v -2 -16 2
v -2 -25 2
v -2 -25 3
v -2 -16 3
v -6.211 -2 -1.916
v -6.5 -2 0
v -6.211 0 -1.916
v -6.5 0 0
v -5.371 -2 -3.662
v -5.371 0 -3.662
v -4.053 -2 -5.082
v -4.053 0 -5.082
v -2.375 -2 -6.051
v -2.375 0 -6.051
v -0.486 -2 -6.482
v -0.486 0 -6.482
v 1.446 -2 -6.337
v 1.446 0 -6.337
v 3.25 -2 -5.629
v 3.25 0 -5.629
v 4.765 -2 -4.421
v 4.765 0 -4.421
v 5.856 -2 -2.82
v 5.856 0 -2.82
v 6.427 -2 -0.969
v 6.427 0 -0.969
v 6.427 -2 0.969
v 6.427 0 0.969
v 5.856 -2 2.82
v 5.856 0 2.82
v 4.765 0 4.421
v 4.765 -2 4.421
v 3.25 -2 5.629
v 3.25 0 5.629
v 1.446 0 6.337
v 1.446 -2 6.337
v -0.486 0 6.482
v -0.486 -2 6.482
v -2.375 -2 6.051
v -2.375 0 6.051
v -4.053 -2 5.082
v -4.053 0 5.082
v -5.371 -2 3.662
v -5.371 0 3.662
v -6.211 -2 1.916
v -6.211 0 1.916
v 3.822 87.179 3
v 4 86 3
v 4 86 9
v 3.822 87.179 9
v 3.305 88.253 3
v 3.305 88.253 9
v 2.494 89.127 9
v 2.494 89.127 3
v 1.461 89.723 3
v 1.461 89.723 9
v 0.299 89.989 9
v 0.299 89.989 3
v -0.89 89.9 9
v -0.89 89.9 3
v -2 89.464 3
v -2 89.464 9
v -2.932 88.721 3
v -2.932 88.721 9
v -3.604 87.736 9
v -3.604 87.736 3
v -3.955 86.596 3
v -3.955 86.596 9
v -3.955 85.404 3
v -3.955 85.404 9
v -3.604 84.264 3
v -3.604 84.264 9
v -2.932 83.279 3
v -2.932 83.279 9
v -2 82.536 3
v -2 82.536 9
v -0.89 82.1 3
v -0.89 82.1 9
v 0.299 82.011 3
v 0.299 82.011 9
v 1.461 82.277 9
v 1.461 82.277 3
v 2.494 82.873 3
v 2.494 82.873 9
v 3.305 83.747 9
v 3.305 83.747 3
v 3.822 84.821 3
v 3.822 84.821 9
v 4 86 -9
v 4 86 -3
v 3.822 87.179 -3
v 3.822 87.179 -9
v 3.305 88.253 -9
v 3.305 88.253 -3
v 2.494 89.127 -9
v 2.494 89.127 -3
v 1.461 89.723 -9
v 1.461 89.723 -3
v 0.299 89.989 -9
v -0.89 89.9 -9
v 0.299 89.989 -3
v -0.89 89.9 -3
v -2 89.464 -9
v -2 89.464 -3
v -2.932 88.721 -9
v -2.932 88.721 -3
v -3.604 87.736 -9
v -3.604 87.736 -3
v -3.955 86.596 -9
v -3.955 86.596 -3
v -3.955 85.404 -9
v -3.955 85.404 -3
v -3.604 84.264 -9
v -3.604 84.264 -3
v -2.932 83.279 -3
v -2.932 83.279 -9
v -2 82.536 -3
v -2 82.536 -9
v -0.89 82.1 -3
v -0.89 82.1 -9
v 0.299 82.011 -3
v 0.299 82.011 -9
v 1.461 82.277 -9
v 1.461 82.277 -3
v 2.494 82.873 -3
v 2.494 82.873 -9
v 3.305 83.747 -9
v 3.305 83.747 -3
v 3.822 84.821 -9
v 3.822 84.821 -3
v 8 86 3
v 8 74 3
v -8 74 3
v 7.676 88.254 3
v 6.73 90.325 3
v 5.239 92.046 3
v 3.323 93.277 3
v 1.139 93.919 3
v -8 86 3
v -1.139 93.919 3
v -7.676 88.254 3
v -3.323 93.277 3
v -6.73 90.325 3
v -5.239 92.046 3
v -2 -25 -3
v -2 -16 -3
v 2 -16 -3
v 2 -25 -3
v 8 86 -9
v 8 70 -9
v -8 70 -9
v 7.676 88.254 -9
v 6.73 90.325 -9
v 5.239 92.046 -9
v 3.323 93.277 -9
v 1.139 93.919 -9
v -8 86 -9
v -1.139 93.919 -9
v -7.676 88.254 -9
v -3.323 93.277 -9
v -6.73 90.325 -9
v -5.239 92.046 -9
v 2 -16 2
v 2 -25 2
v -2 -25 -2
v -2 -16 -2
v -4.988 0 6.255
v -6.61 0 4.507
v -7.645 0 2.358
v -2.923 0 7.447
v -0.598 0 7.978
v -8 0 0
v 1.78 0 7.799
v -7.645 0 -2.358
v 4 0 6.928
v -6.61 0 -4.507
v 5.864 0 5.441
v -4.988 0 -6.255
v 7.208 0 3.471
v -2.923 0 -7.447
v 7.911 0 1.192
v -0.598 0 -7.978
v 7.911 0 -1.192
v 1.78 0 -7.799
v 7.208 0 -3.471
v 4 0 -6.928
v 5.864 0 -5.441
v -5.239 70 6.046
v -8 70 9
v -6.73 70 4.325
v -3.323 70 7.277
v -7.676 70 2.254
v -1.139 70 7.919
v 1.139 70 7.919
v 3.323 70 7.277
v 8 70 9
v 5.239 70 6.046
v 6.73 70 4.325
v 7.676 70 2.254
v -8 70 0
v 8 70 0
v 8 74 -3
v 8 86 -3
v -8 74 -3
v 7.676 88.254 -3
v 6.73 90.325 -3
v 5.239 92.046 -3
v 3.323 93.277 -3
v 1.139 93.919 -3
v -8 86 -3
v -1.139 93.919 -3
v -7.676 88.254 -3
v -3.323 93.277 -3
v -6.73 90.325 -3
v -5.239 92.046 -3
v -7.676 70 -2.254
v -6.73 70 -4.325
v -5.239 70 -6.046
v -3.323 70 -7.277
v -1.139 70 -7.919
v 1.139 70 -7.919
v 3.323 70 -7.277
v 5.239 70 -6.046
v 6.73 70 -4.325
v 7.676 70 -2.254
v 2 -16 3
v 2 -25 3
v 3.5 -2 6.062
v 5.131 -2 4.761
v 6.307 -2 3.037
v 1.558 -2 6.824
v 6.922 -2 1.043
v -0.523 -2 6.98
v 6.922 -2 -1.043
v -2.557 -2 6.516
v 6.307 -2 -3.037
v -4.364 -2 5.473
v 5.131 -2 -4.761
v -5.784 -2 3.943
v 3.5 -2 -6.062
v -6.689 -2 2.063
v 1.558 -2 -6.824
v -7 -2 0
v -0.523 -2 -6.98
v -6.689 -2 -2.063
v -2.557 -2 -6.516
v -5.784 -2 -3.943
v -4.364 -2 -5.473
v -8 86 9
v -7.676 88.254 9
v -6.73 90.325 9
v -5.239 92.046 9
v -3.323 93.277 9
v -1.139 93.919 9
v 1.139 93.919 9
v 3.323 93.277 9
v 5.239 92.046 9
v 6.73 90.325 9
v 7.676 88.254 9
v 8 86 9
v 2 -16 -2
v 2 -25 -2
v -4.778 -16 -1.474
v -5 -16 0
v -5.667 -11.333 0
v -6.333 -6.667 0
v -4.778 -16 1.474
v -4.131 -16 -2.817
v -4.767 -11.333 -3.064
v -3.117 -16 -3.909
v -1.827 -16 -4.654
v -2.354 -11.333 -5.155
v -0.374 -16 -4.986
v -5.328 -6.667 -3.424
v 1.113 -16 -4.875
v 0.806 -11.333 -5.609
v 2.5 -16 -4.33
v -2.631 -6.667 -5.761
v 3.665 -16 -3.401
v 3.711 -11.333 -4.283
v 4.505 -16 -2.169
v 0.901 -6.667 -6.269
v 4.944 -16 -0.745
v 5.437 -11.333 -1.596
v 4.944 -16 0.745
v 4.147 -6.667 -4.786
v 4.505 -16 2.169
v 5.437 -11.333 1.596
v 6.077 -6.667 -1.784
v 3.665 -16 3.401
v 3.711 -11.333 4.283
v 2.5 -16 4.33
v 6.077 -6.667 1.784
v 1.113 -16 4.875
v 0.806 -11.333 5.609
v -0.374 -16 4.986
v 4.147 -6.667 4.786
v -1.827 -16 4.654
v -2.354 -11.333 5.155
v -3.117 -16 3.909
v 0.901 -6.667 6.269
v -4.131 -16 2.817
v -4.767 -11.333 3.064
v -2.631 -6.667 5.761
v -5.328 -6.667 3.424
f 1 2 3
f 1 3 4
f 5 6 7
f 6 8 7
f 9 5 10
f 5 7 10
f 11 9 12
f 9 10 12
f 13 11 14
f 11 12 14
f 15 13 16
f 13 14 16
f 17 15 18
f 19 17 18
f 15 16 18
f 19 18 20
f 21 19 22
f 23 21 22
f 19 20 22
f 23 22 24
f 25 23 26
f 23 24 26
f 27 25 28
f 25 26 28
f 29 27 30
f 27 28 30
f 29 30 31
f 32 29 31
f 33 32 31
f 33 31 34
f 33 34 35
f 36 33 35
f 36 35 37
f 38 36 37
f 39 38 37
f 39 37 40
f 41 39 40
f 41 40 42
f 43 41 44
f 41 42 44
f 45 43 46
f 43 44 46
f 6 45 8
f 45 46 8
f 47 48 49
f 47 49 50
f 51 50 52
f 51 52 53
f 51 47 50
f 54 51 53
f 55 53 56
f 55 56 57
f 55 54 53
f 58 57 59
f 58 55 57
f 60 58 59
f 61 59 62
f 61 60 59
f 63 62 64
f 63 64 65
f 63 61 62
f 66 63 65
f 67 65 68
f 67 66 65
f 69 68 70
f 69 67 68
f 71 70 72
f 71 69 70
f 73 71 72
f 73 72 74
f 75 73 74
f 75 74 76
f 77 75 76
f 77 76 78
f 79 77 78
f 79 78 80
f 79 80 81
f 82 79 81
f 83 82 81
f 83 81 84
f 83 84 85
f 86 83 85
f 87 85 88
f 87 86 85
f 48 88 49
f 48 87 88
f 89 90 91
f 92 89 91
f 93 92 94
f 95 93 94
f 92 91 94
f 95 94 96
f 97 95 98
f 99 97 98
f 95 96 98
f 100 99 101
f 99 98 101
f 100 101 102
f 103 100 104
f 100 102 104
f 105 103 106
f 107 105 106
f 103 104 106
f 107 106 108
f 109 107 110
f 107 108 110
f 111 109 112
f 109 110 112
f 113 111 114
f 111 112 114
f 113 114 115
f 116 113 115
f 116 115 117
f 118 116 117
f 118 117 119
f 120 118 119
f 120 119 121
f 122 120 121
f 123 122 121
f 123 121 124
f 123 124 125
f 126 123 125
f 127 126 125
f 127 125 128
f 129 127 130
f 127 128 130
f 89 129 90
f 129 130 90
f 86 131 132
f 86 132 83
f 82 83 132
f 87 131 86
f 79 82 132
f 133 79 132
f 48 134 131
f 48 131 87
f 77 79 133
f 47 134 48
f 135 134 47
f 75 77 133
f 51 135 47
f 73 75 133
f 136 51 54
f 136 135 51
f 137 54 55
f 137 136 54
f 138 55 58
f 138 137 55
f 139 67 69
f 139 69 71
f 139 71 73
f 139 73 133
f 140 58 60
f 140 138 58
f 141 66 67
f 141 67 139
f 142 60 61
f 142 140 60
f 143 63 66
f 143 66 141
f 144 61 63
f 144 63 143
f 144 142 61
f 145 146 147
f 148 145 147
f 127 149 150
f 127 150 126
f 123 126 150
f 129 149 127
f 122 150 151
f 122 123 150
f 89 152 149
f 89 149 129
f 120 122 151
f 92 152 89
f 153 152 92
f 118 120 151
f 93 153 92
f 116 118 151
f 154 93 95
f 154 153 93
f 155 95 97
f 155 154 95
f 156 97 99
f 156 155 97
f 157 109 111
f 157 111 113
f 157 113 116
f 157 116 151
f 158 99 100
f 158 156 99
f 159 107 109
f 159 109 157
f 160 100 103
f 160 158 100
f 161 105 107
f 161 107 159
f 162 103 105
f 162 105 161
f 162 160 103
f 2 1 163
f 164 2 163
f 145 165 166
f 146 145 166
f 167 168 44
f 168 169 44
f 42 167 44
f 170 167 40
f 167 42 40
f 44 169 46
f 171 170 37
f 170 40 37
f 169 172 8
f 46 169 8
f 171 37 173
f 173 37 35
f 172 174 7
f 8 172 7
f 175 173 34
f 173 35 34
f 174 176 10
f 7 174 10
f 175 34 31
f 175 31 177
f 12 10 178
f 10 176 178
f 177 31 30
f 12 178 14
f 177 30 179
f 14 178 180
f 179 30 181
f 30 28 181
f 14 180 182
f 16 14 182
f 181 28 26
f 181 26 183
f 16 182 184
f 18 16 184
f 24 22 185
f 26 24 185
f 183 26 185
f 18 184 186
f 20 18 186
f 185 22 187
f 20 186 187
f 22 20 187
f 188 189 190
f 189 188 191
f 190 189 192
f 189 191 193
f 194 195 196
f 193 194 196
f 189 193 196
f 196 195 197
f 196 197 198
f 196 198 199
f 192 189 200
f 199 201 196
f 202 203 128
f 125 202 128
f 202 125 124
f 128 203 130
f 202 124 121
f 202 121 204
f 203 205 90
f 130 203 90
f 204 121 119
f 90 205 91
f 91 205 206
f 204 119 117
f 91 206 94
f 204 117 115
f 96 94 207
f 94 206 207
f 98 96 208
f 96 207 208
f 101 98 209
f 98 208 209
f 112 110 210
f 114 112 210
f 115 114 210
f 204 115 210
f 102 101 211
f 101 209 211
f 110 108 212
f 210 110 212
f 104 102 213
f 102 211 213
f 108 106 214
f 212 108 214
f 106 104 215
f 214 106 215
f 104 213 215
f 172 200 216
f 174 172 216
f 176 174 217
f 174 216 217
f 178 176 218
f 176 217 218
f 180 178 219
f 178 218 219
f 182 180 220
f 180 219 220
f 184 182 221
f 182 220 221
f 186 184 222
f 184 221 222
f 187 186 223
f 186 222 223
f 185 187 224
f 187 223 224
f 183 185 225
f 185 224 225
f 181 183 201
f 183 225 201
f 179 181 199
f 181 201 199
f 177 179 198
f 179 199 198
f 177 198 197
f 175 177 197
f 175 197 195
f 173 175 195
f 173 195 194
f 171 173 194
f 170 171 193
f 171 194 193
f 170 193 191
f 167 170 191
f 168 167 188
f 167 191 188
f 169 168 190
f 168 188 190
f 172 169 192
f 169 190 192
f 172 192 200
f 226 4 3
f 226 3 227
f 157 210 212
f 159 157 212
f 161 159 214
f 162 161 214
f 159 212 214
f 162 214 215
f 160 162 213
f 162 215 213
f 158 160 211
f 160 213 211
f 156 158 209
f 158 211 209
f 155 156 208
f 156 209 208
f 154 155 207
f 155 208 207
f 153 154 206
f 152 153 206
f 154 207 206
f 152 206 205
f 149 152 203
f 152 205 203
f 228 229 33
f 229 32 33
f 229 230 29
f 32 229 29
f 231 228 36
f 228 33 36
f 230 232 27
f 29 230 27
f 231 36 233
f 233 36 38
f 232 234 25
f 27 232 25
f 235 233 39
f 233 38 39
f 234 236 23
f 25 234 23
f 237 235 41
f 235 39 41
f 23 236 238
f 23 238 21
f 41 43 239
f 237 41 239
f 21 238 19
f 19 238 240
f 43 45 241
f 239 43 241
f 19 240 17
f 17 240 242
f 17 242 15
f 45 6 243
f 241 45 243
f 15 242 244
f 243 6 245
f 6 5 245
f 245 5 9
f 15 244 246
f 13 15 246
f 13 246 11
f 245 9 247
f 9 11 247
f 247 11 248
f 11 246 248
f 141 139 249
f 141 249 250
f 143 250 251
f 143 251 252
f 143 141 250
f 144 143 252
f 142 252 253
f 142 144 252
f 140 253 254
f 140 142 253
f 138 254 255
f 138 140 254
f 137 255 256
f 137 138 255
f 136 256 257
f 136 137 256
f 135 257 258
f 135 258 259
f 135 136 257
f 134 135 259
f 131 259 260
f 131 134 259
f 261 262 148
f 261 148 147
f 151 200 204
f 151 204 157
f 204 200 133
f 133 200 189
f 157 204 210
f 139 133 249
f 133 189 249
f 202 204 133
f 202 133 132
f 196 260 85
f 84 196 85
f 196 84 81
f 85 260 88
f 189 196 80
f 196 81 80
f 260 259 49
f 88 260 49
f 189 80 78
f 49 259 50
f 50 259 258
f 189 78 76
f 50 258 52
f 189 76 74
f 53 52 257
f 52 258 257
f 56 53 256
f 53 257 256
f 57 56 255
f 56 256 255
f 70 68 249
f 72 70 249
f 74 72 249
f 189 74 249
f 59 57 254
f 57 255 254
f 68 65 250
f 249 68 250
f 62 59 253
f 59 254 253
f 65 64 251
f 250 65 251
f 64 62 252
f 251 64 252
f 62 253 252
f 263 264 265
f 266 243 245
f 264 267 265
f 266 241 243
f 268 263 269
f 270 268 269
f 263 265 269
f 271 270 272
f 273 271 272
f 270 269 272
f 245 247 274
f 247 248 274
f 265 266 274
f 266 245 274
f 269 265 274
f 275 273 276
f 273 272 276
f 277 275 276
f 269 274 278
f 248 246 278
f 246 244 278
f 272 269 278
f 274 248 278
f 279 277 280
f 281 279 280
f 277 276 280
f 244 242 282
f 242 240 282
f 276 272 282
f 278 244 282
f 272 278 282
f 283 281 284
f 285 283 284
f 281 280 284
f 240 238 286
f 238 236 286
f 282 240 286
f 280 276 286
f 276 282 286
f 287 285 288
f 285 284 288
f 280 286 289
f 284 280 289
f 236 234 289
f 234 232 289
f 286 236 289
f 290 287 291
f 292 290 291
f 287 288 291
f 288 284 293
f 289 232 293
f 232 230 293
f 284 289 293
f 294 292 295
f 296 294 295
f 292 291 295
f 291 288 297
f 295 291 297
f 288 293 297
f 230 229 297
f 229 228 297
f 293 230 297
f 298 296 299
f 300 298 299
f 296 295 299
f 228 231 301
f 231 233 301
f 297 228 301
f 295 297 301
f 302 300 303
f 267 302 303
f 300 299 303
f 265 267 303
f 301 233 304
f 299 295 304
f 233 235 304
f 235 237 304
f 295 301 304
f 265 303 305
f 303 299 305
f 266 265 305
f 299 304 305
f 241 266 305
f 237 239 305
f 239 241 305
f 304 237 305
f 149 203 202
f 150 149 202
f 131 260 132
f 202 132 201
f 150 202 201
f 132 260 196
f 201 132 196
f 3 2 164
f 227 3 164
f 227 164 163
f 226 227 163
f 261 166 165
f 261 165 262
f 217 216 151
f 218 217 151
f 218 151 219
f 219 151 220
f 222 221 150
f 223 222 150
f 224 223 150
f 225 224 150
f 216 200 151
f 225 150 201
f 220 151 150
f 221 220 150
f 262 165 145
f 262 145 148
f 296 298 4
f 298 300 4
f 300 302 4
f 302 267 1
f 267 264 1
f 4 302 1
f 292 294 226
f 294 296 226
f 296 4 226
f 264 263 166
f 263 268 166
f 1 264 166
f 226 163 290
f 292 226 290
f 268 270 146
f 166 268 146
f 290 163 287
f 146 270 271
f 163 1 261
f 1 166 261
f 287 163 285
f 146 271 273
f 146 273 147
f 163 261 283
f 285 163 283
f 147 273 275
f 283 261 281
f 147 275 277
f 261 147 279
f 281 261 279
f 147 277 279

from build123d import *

# Parameters (mm, degrees)
SKETCH_2_W      = 16
SKETCH_2_H      = 18
EXTRUDE_1_DEPTH = 4
EXTRUDE_START   = 3
SKETCH_3_R      = 4
EXTRUDE_3_DEPTH = 6
EXTRUDE_START_2 = 2
SKETCH_4_W      = 4
SKETCH_4_H      = 9
EXTRUDE_4_DEPTH = 1


with BuildPart() as part:
    # 草图1 → 旋转1 (revolve)
    with BuildSketch(Plane.XY, mode=Mode.PRIVATE) as revolve_1_sk:
        Polygon((8, 70), (0, 70), (0, -16), (5, -16), (7, -2), (6.5, -2), (6.5, 0), (8, 0), align=None)
    revolve(revolve_1_sk.sketch.rotate(Axis((0, 70, 0), (0, -1, 0)), 180), axis=Axis((0, 70, 0), (0, -1, 0)))

    # 草图2 → 凸台-拉伸1 (add)
    with BuildSketch(Plane(origin=(0, 70, 0), x_dir=(1, 0, 0), z_dir=(0, 1, 0))):
        Rectangle(SKETCH_2_W, SKETCH_2_H)
    extrude(amount=EXTRUDE_1_DEPTH)

    # 草图3 → 凸台-拉伸3 (add)
    with BuildSketch(Plane.XY.offset(EXTRUDE_START)):
        with BuildLine():
            Line((-8, 74), (-8, 86))
            ThreePointArc((-8, 86), (0, 94), (8, 86))
            Line((8, 86), (8, 74))
            Line((8, 74), (-8, 74))
        make_face()
        with Locations((0, 86)):
            Circle(SKETCH_3_R, mode=Mode.SUBTRACT)
    extrude_3 = extrude(amount=EXTRUDE_3_DEPTH)

    # 镜向1: 凸台-拉伸3 across plane
    add(extrude_3.mirror(Plane.XY))

    # 草图4 → 凸台-拉伸4 (add)
    with BuildSketch(Plane.XY.offset(EXTRUDE_START_2)):
        with Locations((0, -20.5)):
            Rectangle(SKETCH_4_W, SKETCH_4_H)
    extrude_4 = extrude(amount=EXTRUDE_4_DEPTH)

    # 镜向2: 凸台-拉伸4 across plane
    add(extrude_4.mirror(Plane.XY))


solid = part.part
